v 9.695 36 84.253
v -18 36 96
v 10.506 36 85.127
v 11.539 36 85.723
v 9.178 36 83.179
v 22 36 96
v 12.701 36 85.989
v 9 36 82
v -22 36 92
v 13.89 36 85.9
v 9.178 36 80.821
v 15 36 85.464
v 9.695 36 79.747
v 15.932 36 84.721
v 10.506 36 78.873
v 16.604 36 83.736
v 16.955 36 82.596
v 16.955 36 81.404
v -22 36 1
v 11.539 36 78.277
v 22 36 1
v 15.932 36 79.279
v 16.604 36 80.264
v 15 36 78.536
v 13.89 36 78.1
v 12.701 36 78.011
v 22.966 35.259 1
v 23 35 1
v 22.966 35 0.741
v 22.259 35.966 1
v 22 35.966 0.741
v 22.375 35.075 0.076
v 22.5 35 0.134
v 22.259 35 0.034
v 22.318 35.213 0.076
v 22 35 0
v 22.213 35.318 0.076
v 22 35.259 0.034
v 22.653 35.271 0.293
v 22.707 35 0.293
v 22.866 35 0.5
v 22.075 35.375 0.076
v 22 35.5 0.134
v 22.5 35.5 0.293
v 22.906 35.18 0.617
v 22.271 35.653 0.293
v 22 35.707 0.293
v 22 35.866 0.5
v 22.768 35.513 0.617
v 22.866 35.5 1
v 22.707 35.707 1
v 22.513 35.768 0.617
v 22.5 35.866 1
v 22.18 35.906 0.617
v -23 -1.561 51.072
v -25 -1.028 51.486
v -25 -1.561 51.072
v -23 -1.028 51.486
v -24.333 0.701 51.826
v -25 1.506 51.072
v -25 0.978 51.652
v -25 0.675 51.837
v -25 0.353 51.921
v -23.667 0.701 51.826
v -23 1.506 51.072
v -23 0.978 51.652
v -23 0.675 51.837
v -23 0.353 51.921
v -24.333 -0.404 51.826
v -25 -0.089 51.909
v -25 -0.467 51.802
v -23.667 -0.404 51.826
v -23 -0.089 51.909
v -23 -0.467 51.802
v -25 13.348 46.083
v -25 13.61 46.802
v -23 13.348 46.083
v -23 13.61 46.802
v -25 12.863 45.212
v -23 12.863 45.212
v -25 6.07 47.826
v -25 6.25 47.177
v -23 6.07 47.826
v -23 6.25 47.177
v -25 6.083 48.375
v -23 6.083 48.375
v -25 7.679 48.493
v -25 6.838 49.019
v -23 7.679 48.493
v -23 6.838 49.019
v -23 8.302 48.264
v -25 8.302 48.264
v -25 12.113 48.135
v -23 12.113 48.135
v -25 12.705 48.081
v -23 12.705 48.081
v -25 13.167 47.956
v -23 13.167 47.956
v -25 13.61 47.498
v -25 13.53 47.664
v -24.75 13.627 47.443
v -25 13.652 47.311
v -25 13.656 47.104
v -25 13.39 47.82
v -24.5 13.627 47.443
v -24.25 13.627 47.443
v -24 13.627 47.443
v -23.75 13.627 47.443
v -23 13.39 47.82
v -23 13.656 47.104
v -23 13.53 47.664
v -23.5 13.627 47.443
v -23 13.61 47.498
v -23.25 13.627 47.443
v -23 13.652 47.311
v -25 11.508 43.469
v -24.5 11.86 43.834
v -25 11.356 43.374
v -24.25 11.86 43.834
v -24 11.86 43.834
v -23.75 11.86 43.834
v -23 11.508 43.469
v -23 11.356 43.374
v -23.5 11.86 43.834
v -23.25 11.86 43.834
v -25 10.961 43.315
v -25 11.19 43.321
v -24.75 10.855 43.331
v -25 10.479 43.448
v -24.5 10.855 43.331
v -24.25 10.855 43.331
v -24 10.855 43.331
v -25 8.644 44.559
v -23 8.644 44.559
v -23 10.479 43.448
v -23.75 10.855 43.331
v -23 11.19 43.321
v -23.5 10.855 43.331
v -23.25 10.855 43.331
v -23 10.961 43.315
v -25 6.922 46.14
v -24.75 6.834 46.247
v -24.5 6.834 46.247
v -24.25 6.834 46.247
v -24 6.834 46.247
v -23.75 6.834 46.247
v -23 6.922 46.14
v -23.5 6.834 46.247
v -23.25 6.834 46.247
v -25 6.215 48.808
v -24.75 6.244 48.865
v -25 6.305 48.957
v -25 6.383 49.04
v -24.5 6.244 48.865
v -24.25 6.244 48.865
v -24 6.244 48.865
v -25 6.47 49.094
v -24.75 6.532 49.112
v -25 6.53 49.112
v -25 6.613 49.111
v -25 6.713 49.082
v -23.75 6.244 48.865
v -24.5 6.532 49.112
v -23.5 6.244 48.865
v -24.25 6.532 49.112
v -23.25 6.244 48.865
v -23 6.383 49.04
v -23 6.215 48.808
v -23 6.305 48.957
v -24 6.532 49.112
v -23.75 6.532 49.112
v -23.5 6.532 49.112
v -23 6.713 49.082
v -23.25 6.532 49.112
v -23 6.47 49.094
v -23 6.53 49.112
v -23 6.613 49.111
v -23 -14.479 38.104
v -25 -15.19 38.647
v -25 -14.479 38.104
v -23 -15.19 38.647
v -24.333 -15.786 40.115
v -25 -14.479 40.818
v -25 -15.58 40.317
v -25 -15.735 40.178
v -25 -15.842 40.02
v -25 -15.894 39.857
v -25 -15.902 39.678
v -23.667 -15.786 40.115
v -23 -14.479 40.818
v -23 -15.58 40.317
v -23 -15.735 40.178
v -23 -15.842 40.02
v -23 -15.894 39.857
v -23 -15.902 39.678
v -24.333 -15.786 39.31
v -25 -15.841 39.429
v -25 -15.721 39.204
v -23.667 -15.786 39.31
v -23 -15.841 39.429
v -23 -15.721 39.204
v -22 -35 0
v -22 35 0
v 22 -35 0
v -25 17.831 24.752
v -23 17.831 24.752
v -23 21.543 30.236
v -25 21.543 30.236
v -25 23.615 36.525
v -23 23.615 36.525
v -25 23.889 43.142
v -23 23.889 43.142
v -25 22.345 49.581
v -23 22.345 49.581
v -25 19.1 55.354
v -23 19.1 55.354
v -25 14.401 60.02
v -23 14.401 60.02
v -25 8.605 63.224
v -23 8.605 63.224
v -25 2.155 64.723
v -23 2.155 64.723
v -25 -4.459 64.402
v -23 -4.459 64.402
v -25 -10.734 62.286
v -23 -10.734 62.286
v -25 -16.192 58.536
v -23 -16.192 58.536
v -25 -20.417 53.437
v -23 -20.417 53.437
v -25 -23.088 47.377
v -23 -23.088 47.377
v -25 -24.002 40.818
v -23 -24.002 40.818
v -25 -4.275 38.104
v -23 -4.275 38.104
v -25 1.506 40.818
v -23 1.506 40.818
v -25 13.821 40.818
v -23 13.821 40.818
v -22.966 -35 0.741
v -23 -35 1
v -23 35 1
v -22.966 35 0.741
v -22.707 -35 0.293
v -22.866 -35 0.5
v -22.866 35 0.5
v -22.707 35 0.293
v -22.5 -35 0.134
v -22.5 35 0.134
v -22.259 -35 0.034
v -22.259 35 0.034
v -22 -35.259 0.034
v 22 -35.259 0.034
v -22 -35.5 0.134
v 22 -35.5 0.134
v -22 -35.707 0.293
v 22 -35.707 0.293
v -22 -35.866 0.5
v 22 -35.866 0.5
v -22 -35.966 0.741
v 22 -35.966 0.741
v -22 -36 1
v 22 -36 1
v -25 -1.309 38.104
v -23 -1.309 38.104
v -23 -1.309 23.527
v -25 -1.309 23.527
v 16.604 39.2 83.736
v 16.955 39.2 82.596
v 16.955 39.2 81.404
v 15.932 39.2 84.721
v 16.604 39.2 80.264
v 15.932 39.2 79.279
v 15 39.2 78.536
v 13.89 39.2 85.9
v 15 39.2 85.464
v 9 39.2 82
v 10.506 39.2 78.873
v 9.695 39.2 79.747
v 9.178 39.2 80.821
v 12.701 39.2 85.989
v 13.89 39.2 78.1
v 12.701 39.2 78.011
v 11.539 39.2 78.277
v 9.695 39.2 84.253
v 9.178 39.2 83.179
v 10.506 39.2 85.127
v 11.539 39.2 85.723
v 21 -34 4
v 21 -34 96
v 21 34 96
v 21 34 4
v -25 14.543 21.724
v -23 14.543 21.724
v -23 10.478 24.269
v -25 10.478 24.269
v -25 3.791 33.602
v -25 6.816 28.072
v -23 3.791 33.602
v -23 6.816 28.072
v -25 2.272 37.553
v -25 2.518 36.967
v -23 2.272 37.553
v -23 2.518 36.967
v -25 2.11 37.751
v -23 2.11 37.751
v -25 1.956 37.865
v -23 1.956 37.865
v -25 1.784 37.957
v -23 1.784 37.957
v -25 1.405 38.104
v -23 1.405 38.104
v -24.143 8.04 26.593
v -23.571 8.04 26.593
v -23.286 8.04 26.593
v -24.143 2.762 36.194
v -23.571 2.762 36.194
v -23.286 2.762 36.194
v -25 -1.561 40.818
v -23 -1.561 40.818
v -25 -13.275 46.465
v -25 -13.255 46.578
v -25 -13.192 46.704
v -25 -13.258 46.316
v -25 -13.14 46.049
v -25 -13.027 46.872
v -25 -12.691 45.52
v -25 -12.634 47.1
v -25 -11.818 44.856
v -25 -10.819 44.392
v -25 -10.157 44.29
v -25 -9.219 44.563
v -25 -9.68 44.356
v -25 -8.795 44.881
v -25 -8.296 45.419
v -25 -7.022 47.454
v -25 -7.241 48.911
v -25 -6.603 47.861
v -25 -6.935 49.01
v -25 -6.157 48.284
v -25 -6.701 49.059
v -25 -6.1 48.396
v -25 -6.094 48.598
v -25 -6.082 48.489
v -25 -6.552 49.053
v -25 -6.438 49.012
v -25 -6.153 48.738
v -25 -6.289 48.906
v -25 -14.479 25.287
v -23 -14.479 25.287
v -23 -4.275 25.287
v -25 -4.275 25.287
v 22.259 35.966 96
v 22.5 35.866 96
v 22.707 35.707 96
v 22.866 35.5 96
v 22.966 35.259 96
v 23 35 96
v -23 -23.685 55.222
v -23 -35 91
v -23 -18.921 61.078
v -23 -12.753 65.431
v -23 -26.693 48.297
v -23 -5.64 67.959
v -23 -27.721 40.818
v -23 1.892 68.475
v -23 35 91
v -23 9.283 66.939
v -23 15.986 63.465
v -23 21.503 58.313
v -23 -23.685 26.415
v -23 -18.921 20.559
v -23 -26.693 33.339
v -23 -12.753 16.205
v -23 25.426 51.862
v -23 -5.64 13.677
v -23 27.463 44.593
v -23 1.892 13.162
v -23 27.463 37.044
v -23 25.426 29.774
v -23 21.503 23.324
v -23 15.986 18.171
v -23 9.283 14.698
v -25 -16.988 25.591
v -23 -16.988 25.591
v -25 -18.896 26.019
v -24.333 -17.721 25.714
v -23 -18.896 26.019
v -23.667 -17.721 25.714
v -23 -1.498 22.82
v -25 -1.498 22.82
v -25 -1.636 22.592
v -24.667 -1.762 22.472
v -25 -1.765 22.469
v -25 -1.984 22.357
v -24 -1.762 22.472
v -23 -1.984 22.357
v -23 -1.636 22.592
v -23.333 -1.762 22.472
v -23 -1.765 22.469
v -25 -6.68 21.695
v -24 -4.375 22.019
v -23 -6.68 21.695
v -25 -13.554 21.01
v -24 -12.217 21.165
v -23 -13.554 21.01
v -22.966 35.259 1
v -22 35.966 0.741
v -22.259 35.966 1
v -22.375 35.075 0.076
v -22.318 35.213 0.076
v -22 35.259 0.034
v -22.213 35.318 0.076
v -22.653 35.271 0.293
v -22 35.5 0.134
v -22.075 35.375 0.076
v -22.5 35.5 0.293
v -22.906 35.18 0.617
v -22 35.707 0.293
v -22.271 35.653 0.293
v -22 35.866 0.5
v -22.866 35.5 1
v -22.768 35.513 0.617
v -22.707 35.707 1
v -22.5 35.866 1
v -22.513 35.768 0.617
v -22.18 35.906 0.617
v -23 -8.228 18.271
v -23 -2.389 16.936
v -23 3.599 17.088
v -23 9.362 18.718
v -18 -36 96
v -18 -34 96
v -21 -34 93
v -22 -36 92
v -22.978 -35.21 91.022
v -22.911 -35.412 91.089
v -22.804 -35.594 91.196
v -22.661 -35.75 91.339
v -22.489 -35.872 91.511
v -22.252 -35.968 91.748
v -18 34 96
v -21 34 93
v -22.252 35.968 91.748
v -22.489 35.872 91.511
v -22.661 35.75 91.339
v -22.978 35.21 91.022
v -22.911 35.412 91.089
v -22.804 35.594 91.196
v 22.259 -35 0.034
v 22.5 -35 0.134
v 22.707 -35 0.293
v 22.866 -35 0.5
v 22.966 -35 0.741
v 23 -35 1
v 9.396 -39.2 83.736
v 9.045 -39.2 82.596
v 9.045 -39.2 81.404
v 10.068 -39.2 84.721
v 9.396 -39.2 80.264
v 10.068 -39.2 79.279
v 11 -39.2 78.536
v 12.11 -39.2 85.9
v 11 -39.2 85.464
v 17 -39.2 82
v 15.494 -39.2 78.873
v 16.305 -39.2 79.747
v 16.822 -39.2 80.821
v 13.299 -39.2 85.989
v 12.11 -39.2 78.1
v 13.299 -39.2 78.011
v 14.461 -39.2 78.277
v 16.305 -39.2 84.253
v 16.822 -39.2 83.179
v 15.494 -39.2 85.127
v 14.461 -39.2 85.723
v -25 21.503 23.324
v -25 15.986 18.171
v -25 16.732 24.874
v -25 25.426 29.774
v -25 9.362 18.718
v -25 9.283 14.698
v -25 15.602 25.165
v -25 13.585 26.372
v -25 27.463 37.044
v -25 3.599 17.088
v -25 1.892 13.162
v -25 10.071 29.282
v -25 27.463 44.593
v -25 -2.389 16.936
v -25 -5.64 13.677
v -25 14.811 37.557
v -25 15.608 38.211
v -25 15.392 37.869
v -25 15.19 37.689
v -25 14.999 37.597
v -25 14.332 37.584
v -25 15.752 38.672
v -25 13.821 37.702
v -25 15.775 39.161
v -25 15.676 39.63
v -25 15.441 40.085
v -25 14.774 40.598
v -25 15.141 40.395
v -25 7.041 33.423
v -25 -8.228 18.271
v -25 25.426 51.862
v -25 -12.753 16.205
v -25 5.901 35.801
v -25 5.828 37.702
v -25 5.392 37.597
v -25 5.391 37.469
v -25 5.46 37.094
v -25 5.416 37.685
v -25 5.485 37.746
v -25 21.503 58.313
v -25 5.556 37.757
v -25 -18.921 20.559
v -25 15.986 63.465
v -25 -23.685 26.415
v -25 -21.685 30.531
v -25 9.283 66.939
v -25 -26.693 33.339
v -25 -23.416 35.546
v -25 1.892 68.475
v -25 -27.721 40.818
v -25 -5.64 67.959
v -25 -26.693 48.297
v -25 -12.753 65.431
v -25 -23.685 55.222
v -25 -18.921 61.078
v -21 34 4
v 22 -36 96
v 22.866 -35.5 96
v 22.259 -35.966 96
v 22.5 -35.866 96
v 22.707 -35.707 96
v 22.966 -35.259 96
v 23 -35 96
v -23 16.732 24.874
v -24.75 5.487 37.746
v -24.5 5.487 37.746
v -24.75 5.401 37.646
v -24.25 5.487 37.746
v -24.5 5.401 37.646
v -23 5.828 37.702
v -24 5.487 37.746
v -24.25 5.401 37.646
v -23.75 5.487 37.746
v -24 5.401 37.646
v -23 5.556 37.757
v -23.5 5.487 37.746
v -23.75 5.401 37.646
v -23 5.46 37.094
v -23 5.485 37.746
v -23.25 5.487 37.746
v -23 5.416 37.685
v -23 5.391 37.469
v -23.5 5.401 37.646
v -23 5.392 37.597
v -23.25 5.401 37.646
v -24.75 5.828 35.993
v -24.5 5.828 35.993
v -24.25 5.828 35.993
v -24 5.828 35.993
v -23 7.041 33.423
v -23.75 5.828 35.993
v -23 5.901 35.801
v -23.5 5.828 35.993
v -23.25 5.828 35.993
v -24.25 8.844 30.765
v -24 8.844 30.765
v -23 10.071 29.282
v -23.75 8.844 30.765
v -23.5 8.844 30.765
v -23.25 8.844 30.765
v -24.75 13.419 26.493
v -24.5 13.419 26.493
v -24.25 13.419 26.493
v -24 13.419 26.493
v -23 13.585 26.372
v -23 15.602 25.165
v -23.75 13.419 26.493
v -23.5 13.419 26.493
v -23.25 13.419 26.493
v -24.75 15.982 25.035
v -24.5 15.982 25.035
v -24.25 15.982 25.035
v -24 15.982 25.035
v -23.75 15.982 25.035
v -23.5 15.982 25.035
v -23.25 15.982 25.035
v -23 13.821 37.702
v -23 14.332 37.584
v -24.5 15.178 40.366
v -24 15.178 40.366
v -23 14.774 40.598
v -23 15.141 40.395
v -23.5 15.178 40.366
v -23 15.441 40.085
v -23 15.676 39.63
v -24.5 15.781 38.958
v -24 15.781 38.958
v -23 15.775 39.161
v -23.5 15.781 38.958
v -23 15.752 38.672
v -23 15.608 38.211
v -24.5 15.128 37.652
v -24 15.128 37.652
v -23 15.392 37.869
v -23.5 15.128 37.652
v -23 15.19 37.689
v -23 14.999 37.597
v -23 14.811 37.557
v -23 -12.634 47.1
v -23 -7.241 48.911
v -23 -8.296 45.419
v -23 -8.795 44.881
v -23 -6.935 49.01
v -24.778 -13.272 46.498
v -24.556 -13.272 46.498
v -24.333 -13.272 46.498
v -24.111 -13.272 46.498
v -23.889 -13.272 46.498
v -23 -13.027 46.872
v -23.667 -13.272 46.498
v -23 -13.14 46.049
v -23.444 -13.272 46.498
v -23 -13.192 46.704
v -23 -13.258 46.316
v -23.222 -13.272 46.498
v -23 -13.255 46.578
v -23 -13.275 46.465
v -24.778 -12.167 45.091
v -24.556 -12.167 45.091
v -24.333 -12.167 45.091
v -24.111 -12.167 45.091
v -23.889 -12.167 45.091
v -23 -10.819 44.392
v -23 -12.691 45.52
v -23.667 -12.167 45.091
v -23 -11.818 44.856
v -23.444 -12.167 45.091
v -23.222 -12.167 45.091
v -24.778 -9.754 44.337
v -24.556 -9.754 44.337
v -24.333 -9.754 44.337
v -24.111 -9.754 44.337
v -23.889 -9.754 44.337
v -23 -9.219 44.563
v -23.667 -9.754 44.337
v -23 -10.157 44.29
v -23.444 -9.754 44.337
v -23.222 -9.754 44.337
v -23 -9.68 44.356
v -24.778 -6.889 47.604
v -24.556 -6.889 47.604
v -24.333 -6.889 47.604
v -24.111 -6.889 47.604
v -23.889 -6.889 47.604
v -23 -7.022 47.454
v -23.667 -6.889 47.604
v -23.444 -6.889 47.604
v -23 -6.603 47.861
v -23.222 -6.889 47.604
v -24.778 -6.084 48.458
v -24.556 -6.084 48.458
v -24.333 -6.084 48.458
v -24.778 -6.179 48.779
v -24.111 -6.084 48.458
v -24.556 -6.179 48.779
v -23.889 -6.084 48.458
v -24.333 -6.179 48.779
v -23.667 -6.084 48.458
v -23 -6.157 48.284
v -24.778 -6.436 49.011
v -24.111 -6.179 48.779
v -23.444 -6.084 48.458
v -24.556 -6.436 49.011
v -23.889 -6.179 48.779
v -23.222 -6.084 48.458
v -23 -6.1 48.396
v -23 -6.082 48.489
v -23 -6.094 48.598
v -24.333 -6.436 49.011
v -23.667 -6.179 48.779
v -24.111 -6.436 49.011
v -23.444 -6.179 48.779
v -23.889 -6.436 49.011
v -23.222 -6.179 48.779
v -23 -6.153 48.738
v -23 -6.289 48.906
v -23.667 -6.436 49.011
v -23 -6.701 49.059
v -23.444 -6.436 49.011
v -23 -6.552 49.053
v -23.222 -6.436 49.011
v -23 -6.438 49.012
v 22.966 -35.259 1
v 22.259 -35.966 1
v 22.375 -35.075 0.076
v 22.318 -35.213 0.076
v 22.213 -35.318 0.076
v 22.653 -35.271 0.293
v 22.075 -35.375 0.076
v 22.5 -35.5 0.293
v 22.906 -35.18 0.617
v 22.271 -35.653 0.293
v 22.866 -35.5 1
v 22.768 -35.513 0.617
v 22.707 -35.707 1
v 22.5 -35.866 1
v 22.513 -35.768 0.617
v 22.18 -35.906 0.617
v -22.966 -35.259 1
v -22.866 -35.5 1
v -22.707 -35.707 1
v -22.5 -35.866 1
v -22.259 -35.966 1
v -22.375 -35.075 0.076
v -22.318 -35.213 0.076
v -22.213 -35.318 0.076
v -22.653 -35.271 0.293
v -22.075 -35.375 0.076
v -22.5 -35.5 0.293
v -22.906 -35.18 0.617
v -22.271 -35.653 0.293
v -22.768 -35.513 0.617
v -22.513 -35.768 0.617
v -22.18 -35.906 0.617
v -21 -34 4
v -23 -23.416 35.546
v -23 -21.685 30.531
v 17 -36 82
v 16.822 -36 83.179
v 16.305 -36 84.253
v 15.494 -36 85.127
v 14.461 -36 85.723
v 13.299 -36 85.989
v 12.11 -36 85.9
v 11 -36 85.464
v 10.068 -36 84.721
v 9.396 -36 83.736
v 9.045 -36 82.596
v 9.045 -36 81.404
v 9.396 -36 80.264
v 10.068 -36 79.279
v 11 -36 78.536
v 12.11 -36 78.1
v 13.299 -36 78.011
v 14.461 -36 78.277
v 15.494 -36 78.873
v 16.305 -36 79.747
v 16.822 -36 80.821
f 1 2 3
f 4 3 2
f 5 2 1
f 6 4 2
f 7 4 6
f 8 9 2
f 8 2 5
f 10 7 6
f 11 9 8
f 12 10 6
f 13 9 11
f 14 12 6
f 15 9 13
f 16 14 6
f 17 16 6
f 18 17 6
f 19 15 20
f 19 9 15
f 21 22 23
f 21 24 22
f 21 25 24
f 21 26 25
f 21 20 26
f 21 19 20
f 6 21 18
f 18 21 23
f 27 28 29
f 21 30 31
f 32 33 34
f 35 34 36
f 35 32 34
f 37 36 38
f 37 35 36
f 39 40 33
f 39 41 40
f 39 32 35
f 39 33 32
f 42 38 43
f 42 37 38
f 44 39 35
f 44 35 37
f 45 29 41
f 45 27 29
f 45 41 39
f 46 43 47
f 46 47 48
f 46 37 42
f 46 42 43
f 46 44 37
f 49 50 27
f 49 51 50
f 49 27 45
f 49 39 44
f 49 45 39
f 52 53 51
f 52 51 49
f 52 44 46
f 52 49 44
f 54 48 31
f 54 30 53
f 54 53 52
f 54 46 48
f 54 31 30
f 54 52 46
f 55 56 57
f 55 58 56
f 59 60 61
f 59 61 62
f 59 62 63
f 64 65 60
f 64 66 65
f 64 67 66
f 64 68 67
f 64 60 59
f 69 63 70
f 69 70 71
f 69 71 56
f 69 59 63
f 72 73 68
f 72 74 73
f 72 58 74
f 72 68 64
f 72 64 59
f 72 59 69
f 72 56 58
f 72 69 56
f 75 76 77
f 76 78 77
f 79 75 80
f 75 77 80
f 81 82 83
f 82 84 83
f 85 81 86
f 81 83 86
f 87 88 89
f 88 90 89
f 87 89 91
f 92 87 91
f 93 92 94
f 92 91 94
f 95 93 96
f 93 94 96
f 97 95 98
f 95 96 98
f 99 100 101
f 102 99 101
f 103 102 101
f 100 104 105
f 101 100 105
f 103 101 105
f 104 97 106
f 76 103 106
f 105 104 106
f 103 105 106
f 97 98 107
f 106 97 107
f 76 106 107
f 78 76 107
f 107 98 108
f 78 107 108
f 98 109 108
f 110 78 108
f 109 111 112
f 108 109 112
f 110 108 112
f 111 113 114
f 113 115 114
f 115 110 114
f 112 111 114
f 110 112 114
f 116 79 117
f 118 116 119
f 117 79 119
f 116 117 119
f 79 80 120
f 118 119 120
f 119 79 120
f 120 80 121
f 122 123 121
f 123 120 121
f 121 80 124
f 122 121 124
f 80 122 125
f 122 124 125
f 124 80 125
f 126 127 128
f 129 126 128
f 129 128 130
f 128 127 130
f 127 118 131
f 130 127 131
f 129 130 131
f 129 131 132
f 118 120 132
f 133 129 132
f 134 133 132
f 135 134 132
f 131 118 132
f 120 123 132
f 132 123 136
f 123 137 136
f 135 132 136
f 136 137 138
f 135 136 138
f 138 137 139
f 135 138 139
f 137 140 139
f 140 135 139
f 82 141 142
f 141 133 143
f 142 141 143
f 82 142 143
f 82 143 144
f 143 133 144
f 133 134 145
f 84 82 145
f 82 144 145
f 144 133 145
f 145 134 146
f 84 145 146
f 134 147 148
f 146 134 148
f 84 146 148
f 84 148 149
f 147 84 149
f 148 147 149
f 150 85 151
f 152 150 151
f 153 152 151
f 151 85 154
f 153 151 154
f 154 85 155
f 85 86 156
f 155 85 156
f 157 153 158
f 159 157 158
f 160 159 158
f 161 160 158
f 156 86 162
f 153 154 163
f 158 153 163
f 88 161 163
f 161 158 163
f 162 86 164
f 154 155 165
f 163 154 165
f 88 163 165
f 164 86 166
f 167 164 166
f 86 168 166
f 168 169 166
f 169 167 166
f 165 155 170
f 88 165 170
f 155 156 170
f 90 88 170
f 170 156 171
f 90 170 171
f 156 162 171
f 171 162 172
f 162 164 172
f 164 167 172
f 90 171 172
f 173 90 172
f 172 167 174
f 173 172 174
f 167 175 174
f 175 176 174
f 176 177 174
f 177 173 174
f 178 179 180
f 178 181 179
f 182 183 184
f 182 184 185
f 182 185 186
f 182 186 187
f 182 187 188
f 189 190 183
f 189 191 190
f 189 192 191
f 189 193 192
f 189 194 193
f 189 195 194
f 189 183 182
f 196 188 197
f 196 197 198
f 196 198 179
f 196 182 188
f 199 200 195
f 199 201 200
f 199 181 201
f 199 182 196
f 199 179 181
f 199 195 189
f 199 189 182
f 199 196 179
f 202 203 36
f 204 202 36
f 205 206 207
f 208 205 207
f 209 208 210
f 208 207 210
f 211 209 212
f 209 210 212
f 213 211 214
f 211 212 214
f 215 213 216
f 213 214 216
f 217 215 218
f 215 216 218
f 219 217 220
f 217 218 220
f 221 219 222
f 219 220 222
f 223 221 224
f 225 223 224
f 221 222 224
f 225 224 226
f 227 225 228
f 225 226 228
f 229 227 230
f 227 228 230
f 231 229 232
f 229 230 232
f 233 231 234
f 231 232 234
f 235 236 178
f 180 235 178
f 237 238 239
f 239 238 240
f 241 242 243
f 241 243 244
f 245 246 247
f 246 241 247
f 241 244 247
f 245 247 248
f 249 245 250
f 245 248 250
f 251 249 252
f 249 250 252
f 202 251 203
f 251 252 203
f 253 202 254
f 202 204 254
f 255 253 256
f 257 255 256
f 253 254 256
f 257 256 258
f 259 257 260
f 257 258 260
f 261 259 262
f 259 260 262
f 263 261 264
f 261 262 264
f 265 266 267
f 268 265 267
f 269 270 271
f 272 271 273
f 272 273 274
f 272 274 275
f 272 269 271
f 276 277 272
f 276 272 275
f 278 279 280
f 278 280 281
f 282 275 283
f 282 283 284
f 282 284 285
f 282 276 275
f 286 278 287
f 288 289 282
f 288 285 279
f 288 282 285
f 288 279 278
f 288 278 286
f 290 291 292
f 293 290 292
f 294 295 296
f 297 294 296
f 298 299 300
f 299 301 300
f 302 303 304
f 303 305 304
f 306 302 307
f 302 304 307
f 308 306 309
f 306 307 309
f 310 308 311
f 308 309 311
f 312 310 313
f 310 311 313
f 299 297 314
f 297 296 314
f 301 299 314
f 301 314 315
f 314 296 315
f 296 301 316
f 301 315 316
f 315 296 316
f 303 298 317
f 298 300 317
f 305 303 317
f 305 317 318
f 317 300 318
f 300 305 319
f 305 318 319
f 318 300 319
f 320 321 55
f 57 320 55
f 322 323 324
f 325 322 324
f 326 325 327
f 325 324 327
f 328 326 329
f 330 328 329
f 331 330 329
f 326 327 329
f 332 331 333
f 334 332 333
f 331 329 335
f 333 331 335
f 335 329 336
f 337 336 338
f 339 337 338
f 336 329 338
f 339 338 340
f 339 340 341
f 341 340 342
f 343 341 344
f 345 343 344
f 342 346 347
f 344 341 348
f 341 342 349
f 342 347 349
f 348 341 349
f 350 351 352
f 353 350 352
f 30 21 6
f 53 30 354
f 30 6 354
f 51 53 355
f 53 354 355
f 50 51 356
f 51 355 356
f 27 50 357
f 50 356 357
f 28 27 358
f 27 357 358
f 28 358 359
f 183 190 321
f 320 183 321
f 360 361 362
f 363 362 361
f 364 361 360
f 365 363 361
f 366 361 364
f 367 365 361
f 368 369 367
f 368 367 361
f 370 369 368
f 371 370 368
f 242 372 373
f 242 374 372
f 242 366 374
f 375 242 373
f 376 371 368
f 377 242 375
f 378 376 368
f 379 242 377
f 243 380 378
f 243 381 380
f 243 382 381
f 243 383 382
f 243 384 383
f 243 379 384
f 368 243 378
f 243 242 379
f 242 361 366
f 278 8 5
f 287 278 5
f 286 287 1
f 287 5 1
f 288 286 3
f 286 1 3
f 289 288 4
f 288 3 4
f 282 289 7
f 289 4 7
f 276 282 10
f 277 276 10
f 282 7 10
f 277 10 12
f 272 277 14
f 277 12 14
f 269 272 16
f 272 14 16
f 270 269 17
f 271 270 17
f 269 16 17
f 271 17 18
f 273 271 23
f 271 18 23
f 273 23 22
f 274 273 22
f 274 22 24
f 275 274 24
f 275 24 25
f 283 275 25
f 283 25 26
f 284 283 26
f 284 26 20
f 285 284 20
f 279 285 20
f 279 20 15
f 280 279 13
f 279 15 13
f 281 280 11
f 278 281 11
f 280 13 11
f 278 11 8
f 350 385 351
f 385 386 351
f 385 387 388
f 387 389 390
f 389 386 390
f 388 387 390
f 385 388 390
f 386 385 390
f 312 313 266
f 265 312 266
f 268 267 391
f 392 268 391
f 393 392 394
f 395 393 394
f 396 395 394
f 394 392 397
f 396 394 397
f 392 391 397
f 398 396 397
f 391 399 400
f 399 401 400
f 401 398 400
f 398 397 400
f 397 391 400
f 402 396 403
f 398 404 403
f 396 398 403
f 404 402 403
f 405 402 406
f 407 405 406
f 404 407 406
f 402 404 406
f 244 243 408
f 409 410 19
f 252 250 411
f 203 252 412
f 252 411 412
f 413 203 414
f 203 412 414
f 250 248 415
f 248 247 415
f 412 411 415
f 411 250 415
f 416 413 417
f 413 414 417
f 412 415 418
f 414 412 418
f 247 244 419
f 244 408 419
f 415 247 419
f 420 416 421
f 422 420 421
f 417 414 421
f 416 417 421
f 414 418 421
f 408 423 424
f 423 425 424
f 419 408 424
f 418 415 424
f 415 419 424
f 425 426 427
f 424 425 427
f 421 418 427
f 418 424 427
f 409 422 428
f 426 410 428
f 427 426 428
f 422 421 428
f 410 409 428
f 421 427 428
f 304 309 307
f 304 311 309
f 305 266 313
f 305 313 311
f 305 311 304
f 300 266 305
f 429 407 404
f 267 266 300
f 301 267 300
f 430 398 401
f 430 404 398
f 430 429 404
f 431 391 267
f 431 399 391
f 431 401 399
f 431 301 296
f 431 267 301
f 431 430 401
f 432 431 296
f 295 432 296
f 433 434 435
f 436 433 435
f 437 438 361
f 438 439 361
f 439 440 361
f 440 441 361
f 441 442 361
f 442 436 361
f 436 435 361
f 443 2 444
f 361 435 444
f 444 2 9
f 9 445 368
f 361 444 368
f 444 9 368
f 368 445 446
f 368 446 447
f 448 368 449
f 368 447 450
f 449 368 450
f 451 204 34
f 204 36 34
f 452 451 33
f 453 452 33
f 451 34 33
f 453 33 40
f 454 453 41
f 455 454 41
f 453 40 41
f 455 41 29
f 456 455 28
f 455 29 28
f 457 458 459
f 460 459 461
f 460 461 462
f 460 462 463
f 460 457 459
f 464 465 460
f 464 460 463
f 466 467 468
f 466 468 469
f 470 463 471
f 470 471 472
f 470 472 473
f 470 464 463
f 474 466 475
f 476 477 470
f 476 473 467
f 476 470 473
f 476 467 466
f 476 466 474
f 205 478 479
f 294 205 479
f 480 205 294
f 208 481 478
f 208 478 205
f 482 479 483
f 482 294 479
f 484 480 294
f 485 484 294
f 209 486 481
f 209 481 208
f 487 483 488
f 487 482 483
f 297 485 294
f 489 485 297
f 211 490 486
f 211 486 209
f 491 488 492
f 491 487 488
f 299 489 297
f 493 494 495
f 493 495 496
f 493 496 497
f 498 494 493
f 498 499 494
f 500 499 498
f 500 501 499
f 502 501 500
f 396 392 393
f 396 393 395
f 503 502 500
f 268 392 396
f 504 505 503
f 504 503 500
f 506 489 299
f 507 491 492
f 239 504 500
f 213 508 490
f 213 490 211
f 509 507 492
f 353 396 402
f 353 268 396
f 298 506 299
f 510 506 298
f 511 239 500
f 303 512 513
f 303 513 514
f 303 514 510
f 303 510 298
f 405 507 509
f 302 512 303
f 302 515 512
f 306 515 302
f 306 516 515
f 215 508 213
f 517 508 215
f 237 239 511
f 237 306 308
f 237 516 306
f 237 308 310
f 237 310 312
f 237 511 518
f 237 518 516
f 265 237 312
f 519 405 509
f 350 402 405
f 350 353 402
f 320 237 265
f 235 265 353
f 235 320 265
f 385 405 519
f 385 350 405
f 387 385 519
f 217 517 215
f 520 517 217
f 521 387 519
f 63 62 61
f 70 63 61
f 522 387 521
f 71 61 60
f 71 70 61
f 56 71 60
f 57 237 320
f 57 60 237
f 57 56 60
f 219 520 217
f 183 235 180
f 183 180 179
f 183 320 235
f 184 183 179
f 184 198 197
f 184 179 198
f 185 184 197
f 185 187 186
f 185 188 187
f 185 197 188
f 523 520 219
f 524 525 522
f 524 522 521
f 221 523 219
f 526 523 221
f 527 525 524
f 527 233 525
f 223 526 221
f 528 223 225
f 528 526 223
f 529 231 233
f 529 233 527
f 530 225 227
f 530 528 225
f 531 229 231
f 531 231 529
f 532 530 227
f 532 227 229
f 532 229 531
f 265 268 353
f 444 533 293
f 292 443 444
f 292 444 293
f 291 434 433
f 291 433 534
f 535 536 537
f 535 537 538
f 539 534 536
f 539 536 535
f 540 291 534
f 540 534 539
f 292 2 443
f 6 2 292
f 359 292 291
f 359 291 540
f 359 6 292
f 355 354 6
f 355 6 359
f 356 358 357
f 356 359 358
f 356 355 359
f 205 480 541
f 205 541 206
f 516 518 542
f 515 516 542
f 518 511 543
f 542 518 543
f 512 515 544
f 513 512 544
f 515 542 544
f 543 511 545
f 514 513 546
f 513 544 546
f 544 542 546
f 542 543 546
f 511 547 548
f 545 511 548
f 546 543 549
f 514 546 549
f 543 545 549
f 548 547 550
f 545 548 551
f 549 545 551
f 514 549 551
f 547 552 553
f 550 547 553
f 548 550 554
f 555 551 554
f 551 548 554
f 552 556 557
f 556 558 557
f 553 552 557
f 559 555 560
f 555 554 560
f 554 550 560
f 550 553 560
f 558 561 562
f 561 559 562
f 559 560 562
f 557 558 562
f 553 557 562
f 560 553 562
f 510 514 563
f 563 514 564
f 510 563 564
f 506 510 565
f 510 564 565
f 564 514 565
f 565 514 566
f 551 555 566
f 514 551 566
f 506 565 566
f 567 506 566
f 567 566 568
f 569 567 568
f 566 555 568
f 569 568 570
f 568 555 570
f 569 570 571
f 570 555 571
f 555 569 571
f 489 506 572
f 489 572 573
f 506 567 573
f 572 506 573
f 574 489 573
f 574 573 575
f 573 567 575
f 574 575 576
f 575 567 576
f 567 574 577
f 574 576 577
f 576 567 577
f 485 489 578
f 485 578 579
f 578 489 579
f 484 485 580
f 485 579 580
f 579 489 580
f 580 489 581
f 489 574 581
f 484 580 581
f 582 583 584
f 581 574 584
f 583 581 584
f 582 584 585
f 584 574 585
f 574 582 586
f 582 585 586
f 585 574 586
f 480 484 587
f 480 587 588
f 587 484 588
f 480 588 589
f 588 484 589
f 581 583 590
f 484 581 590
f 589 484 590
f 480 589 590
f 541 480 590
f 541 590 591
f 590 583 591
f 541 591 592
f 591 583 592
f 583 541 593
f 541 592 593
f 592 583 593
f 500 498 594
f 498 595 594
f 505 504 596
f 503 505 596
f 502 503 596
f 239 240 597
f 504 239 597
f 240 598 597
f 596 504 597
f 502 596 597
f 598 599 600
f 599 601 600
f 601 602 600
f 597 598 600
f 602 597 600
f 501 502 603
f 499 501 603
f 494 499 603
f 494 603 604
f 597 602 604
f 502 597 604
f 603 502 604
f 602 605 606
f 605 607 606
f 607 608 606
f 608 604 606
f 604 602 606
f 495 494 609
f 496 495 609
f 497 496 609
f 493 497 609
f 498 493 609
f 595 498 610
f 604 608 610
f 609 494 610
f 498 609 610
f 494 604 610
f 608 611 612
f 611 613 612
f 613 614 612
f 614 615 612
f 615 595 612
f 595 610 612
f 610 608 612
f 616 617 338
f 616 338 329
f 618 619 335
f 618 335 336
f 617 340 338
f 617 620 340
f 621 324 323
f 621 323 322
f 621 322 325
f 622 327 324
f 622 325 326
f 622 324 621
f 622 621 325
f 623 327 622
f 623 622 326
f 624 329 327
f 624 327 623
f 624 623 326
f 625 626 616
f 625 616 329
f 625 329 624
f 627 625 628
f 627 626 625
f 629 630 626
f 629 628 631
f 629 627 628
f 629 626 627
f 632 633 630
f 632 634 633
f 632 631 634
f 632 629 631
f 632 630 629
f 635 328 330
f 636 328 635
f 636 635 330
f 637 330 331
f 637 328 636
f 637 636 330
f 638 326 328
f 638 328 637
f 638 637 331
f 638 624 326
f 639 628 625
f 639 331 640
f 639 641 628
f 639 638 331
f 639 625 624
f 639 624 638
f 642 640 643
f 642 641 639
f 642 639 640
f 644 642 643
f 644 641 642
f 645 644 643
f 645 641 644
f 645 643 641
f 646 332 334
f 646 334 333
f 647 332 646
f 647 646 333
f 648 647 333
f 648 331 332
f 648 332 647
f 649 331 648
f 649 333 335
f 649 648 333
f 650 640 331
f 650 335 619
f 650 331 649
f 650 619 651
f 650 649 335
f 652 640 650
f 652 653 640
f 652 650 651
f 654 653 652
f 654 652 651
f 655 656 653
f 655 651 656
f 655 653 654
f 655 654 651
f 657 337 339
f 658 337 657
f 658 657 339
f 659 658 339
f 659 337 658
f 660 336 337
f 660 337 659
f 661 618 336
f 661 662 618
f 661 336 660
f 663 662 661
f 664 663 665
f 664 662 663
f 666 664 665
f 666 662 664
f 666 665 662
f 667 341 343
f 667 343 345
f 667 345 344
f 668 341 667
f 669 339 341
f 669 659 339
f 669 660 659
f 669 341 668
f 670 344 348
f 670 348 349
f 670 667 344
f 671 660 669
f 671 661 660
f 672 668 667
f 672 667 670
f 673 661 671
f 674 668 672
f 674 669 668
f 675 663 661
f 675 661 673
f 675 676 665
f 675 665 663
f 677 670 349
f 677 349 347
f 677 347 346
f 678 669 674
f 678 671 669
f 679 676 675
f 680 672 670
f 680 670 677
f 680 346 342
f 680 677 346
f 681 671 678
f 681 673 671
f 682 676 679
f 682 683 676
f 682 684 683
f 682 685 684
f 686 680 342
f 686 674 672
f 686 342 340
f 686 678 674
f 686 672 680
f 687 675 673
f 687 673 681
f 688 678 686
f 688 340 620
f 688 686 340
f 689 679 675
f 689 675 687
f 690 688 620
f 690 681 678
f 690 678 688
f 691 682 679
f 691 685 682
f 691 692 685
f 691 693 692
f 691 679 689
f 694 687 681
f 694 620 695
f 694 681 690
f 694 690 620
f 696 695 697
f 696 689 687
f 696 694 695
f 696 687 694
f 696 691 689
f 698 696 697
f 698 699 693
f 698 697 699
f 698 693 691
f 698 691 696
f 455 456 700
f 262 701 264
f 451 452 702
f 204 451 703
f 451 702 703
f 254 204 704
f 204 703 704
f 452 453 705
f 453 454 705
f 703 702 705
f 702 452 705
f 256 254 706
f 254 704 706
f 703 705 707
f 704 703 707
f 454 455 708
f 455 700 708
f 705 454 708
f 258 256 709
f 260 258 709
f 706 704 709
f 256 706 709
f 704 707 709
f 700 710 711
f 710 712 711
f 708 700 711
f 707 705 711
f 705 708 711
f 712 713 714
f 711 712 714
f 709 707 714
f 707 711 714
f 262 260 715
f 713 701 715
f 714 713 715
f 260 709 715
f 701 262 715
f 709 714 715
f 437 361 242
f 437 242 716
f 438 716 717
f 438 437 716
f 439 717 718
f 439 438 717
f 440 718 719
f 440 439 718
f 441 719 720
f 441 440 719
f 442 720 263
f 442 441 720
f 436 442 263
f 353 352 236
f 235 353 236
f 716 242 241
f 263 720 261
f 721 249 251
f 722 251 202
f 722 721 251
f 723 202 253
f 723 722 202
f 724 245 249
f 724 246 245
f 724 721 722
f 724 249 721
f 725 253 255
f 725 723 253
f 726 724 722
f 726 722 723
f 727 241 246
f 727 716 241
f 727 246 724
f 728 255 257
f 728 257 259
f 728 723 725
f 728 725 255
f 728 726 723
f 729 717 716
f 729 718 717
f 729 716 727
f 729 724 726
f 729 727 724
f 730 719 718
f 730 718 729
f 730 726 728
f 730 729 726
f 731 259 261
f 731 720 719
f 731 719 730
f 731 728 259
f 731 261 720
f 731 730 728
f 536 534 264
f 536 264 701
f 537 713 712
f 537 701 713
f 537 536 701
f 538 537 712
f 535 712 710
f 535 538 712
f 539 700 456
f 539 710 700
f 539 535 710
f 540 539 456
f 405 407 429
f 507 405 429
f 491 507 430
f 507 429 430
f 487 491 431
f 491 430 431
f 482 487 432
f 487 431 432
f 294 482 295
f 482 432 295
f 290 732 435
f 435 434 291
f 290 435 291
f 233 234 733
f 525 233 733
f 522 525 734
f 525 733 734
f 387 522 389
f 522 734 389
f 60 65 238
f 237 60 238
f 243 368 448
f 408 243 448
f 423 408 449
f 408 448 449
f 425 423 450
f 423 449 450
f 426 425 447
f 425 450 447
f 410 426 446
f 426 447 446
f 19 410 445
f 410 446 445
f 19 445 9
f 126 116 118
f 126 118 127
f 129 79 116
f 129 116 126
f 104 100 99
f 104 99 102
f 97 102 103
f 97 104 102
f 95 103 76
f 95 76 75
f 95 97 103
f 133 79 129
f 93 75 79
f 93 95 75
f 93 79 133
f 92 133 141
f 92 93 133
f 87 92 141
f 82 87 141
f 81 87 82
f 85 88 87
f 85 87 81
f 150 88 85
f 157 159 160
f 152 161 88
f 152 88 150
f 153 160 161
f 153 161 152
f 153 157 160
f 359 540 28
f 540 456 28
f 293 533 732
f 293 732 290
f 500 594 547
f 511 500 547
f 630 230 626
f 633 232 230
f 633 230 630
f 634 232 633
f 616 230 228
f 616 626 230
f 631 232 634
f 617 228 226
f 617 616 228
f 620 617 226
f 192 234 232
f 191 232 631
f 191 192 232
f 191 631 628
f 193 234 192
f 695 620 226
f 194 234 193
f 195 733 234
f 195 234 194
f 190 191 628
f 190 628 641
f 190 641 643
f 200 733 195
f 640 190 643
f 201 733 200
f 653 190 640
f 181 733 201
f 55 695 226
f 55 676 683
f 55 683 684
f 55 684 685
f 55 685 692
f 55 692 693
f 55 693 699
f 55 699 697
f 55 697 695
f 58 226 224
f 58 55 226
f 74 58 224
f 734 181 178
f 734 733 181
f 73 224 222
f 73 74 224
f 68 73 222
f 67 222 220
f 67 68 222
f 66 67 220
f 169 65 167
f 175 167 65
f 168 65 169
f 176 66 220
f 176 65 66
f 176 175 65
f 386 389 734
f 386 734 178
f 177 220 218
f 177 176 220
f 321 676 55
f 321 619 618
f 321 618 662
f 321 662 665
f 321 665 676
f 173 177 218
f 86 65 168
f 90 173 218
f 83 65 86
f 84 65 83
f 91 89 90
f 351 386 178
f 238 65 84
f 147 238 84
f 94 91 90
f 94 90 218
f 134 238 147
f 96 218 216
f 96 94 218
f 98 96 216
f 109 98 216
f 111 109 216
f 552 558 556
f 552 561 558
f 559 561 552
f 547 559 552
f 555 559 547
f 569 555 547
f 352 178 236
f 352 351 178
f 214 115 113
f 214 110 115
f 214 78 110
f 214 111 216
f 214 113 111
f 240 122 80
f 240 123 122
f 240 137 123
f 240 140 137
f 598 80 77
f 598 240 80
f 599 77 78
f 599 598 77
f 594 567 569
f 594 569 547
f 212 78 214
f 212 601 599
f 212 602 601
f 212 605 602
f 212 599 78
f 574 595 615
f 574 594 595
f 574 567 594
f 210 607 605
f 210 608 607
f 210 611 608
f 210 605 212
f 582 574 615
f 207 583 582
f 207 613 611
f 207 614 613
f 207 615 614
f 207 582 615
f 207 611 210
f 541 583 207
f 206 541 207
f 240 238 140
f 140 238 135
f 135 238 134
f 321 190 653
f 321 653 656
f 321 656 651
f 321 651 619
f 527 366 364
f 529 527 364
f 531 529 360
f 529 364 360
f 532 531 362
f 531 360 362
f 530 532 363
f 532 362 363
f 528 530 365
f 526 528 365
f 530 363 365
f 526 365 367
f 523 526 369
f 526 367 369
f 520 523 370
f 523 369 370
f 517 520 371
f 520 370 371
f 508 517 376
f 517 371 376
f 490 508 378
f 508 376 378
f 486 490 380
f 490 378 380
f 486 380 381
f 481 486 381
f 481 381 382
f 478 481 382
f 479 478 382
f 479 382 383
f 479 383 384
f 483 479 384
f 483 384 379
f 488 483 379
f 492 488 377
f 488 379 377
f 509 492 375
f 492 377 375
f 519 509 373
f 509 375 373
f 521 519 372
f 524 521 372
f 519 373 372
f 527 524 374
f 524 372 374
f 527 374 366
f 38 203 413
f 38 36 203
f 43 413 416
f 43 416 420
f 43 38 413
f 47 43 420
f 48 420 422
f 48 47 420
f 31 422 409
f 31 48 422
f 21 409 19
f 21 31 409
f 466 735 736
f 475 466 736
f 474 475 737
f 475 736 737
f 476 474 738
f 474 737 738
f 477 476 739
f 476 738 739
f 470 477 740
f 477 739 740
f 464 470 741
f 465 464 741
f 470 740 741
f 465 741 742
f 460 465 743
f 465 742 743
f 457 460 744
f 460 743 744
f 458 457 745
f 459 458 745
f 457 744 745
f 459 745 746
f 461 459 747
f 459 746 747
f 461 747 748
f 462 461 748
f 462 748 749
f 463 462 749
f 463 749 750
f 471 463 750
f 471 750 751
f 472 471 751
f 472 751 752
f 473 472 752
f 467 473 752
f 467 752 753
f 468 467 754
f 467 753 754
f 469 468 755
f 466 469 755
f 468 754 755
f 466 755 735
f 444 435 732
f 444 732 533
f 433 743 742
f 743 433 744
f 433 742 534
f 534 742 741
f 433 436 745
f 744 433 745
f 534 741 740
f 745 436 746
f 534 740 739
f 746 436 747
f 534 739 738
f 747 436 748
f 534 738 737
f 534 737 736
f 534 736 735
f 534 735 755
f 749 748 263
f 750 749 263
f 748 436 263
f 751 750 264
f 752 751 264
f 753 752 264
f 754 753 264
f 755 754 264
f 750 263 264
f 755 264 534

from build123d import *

# Parameters (mm, degrees)
F0_W        = 46
F0_H        = 72
F1_DEPTH    = 96
F2_W        = 42
F2_H        = 68
F3_DEPTH    = 92
F4_R        = 4
F5_DEPTH    = 3.2
F6_R        = 4
F7_DEPTH    = 3.2
F8_T1_DEPTH = 97.7168298797
F9_R        = 1
F10_R       = 27.7209608442
F11_DEPTH   = 2


# Not quite as in the source:
# - a fillet or chamfer that OpenCascade refuses, or shapes differently, is made with other operations: its cross-section is extruded or revolved along the edge and cut away or added


with BuildPart() as f1:
    # F0 (on Top) → F1 (new body)
    with BuildSketch(Plane.XY):
        Rectangle(F0_W, F0_H)
    extrude(amount=F1_DEPTH)

    # F2 (on face) → F3 (cut)
    with BuildSketch(Plane.XY.offset(96)):
        Rectangle(F2_W, F2_H)
    extrude(amount=-F3_DEPTH, mode=Mode.SUBTRACT)

    # F4 (on face) → F5 (join)
    with BuildSketch(Plane.XZ.offset(36)):
        with Locations((13, 82)):
            Circle(F4_R)
    extrude(amount=F5_DEPTH)

    # F6 (on face) → F7 (join)
    with BuildSketch(Plane(origin=(0, 36, 0), x_dir=(-1, 0, 0), z_dir=(0, 1, 0))):
        with Locations((-13, 82)):
            Circle(F6_R)
    extrude(amount=F7_DEPTH)

    # F8: chamfer of 5 on 1 edges, made by hand

    # F8_s2 → F8_t1 (cut)
    with BuildSketch(Plane.XZ.offset(-48.8584149398)):
        Polygon((-18, 96), (-23, 91), (-23, 96), align=None)
    extrude(amount=F8_T1_DEPTH, mode=Mode.SUBTRACT)

    # F9
    f9_edges = [f1.edges().sort_by_distance(p)[0] for p in [
        (-23, -36, 45.5),
        (23, -36, 48),
        (23, 36, 48),
        (-23, 36, 45.5),
        (23, 0, 0),
        (-23, 0, 0),
        (0, 36, 0),
        (0, -36, 0),
    ]]
    fillet(f9_edges, radius=F9_R)

    # F10 (on face) → F11 (join)
    with BuildSketch(Plane(origin=(-23, 0, 0), x_dir=(0, -1, 0), z_dir=(-1, 0, 0))):
        with Locations((0, 40.8182404935)):
            Circle(F10_R)
        with BuildLine():
            add(Edge.make_bspline(
                [(-17.8310812866, 24.7516158604), (-18.0416931886, 24.731624497), (-18.6386807496, 24.6684959969), (-19.2717295968, 24.3841029538), (-19.5649090195, 21.6870798509), (-16.5966593688, 21.0684697904), (-15.2211504824, 21.4407750456), (-14.5426337104, 21.7238514822)],
                knots=[0.4132110552, 0.4132110552, 0.4132110552, 0.4132110552, 0.4283251344, 0.4603190645, 0.510541782, 0.5666924956, 0.615415561, 0.615415561, 0.615415561, 0.615415561], degree=3))
            ThreePointArc((-17.8310812866, 24.7516158604), (-8.6054277875, 63.2242776163), (24.0017475812, 40.8182404935))
            ThreePointArc((24.0017475812, 40.8182404935), (22.6894322226, 32.9904980114), (18.8959899976, 26.0187320907))
            add(Edge.make_bspline(
                [(13.5544067846, 21.0101122713), (15.1773683066, 20.8286148298), (18.6415516168, 20.5611168513), (20.2513827461, 23.1969599021), (20.017563928, 26.727985113), (19.3356446095, 26.1886613097), (18.9151411243, 26.0259448267), (18.8959899976, 26.0187320907)],
                knots=[0.4868760993, 0.4868760993, 0.4868760993, 0.4868760993, 0.6035189288, 0.7106541171, 0.8124300784, 0.8685997483, 0.87123087, 0.87123087, 0.87123087, 0.87123087], degree=3))
            ThreePointArc((13.5544067846, 21.0101122713), (-0.6095113038, 16.8242332642), (-14.5426337104, 21.7238514822))
        make_face(mode=Mode.SUBTRACT)
        with BuildLine():
            add(Edge.make_bspline(
                [(-13.1672387943, 47.9557514191), (-13.6789435568, 47.7302779724), (-13.8554780387, 46.5012200329), (-11.906507855, 43.7928351191), (-10.8613262187, 42.8100774548), (-6.4416701192, 46.0388131445), (-5.8697363247, 48.1862573802), (-6.5496625571, 49.5720681387), (-8.0107671732, 47.5720952119), (-12.18493142, 48.3885873933), (-13.1672387943, 47.9557514191)],
                knots=[0, 0, 0, 0, 0.0951179589, 0.2427295185, 0.3289680533, 0.5102542132, 0.6320447089, 0.7083203168, 0.817404333, 1, 1, 1, 1], degree=3))
        make_face()
        with BuildLine():
            add(Edge.make_bspline(
                [(-1.5056377742, 51.0721281171), (-1.2655745051, 51.376089636), (-0.785072868, 51.9844876136), (0.4890633383, 51.9466317035), (1.1904519521, 51.3741917059), (1.5605587978, 51.0721281171)],
                knots=[0, 0, 0, 0, 0.3204609859, 0.6414226921, 1, 1, 1, 1], degree=3))
            Line((-1.5056377742, 51.0721281171), (-1.5056377742, 40.8182404935))
            Line((-1.5056377742, 40.8182404935), (-13.8206910342, 40.8182404935))
            add(Edge.make_bspline(
                [(-13.8206910342, 40.8182404935), (-14.3163583008, 40.7406958322), (-15.3248298347, 40.5829255117), (-16.0298313022, 38.9853309187), (-15.2661185632, 37.3287424191), (-14.2935212413, 37.5798078265), (-13.8206910342, 37.7018637955)],
                knots=[0, 0, 0, 0, 0.2499158182, 0.5084721255, 0.7610427034, 1, 1, 1, 1], degree=3))
            Line((-13.8206910342, 37.7018637955), (-5.8284727857, 37.7018637955))
            add(Edge.make_bspline(
                [(-5.8284727857, 37.7018637955), (-5.6616792118, 37.7493233921), (-5.1463725609, 37.8959492194), (-5.9050859697, 35.7190459632), (-6.7314491211, 33.7727840823), (-8.8298986523, 30.6803066265), (-10.7443809665, 28.4421062956), (-13.4166866054, 26.493634755), (-15.5645127805, 24.9310548857), (-17.2805677978, 24.8038708143), (-17.8310812866, 24.7516158604)],
                knots=[0, 0, 0, 0, 0.0221816863, 0.0685300411, 0.1230509283, 0.1896466414, 0.2504984271, 0.3136356503, 0.3737047196, 0.4132110552, 0.4132110552, 0.4132110552, 0.4132110552], degree=3))
            ThreePointArc((-17.8310812866, 24.7516158604), (-16.2574965773, 23.1610127385), (-14.5426337104, 21.7238514822))
            add(Edge.make_bspline(
                [(-14.5426337104, 21.7238514822), (-14.4700608663, 21.7541287914), (-13.4868489797, 22.1787471182), (-11.2173445731, 23.4933801542), (-7.8402676501, 26.6128816263), (-5.3447073755, 29.9791410107), (-2.6936822721, 35.9836558885), (-2.3564969432, 37.7686367648), (-1.6866975363, 38.0047224883), (-1.4051069738, 38.1039753556)],
                knots=[0.615415561, 0.615415561, 0.615415561, 0.615415561, 0.620626886, 0.6855816442, 0.7596479515, 0.8338925842, 0.9230870978, 0.9676650246, 1, 1, 1, 1], degree=3))
            Line((-1.4051069738, 38.1039753556), (1.3092315057, 38.1039753556))
            Line((1.3092315057, 38.1039753556), (1.3092315057, 23.5273707658))
            add(Edge.make_bspline(
                [(1.3092315057, 23.5273707658), (1.3901833114, 23.1062891887), (1.5582802327, 22.2319107086), (3.1836032161, 22.2640424108), (4.3821273184, 21.9811997778), (8.5768144522, 21.4369863905), (10.9865964285, 21.3213558963), (13.0868251542, 21.0624024017), (13.5544067846, 21.0101122713)],
                knots=[0, 0, 0, 0, 0.0661108801, 0.1372796485, 0.2082189036, 0.3308717094, 0.453270839, 0.4868760993, 0.4868760993, 0.4868760993, 0.4868760993], degree=3))
            ThreePointArc((13.5544067846, 21.0101122713), (16.4173271562, 23.3095210658), (18.8959899976, 26.0187320907))
            add(Edge.make_bspline(
                [(18.8959899976, 26.0187320907), (17.958719042, 25.6657352116), (16.2187585332, 25.4761750532), (14.4787980244, 25.2866148949)],
                knots=[0.87123087, 0.87123087, 0.87123087, 0.87123087, 1, 1, 1, 1], degree=3))
            Line((14.4787980244, 25.2866148949), (4.274897743, 25.2866148949))
            Line((4.274897743, 25.2866148949), (4.274897743, 38.1039753556))
            Line((4.274897743, 38.1039753556), (14.4787980244, 38.1039753556))
            add(Edge.make_bspline(
                [(14.4787980244, 40.8182404935), (15.0214152926, 40.622477907), (15.9634432149, 40.2826180585), (15.9221942597, 39.1563781008), (15.0189015911, 38.4977733041), (14.4787980244, 38.1039753556)],
                knots=[0, 0, 0, 0, 0.3532671261, 0.6133006012, 1, 1, 1, 1], degree=3))
            Line((14.4787980244, 40.8182404935), (1.5605587978, 40.8182404935))
            Line((1.5605587978, 40.8182404935), (1.5605587978, 51.0721281171))
        make_face()
        with BuildLine():
            add(Edge.make_bspline(
                [(7.2405622341, 48.9107705653), (8.1951903629, 48.5928249221), (11.5971201687, 47.54062061), (13.8463110022, 46.6584207463), (12.1718507315, 44.887582687), (9.6429349022, 43.7513572457), (7.7599373396, 45.9568749284), (7.1288066509, 47.6332666706), (5.7942155786, 48.3483342452), (6.4651933332, 49.1853042153), (6.8443509441, 49.0427315348), (7.2405622341, 48.9107705653)],
                knots=[0, 0, 0, 0, 0.1778305446, 0.288661815, 0.3983430252, 0.5286875411, 0.6581067636, 0.7710159609, 0.8598240036, 0.9261927579, 1, 1, 1, 1], degree=3))
        make_face()
        with BuildLine():
            ThreePointArc((-14.5426337104, 21.7238514822), (-16.2574965773, 23.1610127385), (-17.8310812866, 24.7516158604))
            add(Edge.make_bspline(
                [(-17.8310812866, 24.7516158604), (-18.0416931886, 24.731624497), (-18.6386807496, 24.6684959969), (-19.2717295968, 24.3841029538), (-19.5649090195, 21.6870798509), (-16.5966593688, 21.0684697904), (-15.2211504824, 21.4407750456), (-14.5426337104, 21.7238514822)],
                knots=[0.4132110552, 0.4132110552, 0.4132110552, 0.4132110552, 0.4283251344, 0.4603190645, 0.510541782, 0.5666924956, 0.615415561, 0.615415561, 0.615415561, 0.615415561], degree=3))
        make_face()
        with BuildLine():
            ThreePointArc((18.8959899976, 26.0187320907), (16.4173271562, 23.3095210658), (13.5544067846, 21.0101122713))
            add(Edge.make_bspline(
                [(13.5544067846, 21.0101122713), (15.1773683066, 20.8286148298), (18.6415516168, 20.5611168513), (20.2513827461, 23.1969599021), (20.017563928, 26.727985113), (19.3356446095, 26.1886613097), (18.9151411243, 26.0259448267), (18.8959899976, 26.0187320907)],
                knots=[0.4868760993, 0.4868760993, 0.4868760993, 0.4868760993, 0.6035189288, 0.7106541171, 0.8124300784, 0.8685997483, 0.87123087, 0.87123087, 0.87123087, 0.87123087], degree=3))
        make_face()
    extrude(amount=F11_DEPTH)


solid = f1.part
